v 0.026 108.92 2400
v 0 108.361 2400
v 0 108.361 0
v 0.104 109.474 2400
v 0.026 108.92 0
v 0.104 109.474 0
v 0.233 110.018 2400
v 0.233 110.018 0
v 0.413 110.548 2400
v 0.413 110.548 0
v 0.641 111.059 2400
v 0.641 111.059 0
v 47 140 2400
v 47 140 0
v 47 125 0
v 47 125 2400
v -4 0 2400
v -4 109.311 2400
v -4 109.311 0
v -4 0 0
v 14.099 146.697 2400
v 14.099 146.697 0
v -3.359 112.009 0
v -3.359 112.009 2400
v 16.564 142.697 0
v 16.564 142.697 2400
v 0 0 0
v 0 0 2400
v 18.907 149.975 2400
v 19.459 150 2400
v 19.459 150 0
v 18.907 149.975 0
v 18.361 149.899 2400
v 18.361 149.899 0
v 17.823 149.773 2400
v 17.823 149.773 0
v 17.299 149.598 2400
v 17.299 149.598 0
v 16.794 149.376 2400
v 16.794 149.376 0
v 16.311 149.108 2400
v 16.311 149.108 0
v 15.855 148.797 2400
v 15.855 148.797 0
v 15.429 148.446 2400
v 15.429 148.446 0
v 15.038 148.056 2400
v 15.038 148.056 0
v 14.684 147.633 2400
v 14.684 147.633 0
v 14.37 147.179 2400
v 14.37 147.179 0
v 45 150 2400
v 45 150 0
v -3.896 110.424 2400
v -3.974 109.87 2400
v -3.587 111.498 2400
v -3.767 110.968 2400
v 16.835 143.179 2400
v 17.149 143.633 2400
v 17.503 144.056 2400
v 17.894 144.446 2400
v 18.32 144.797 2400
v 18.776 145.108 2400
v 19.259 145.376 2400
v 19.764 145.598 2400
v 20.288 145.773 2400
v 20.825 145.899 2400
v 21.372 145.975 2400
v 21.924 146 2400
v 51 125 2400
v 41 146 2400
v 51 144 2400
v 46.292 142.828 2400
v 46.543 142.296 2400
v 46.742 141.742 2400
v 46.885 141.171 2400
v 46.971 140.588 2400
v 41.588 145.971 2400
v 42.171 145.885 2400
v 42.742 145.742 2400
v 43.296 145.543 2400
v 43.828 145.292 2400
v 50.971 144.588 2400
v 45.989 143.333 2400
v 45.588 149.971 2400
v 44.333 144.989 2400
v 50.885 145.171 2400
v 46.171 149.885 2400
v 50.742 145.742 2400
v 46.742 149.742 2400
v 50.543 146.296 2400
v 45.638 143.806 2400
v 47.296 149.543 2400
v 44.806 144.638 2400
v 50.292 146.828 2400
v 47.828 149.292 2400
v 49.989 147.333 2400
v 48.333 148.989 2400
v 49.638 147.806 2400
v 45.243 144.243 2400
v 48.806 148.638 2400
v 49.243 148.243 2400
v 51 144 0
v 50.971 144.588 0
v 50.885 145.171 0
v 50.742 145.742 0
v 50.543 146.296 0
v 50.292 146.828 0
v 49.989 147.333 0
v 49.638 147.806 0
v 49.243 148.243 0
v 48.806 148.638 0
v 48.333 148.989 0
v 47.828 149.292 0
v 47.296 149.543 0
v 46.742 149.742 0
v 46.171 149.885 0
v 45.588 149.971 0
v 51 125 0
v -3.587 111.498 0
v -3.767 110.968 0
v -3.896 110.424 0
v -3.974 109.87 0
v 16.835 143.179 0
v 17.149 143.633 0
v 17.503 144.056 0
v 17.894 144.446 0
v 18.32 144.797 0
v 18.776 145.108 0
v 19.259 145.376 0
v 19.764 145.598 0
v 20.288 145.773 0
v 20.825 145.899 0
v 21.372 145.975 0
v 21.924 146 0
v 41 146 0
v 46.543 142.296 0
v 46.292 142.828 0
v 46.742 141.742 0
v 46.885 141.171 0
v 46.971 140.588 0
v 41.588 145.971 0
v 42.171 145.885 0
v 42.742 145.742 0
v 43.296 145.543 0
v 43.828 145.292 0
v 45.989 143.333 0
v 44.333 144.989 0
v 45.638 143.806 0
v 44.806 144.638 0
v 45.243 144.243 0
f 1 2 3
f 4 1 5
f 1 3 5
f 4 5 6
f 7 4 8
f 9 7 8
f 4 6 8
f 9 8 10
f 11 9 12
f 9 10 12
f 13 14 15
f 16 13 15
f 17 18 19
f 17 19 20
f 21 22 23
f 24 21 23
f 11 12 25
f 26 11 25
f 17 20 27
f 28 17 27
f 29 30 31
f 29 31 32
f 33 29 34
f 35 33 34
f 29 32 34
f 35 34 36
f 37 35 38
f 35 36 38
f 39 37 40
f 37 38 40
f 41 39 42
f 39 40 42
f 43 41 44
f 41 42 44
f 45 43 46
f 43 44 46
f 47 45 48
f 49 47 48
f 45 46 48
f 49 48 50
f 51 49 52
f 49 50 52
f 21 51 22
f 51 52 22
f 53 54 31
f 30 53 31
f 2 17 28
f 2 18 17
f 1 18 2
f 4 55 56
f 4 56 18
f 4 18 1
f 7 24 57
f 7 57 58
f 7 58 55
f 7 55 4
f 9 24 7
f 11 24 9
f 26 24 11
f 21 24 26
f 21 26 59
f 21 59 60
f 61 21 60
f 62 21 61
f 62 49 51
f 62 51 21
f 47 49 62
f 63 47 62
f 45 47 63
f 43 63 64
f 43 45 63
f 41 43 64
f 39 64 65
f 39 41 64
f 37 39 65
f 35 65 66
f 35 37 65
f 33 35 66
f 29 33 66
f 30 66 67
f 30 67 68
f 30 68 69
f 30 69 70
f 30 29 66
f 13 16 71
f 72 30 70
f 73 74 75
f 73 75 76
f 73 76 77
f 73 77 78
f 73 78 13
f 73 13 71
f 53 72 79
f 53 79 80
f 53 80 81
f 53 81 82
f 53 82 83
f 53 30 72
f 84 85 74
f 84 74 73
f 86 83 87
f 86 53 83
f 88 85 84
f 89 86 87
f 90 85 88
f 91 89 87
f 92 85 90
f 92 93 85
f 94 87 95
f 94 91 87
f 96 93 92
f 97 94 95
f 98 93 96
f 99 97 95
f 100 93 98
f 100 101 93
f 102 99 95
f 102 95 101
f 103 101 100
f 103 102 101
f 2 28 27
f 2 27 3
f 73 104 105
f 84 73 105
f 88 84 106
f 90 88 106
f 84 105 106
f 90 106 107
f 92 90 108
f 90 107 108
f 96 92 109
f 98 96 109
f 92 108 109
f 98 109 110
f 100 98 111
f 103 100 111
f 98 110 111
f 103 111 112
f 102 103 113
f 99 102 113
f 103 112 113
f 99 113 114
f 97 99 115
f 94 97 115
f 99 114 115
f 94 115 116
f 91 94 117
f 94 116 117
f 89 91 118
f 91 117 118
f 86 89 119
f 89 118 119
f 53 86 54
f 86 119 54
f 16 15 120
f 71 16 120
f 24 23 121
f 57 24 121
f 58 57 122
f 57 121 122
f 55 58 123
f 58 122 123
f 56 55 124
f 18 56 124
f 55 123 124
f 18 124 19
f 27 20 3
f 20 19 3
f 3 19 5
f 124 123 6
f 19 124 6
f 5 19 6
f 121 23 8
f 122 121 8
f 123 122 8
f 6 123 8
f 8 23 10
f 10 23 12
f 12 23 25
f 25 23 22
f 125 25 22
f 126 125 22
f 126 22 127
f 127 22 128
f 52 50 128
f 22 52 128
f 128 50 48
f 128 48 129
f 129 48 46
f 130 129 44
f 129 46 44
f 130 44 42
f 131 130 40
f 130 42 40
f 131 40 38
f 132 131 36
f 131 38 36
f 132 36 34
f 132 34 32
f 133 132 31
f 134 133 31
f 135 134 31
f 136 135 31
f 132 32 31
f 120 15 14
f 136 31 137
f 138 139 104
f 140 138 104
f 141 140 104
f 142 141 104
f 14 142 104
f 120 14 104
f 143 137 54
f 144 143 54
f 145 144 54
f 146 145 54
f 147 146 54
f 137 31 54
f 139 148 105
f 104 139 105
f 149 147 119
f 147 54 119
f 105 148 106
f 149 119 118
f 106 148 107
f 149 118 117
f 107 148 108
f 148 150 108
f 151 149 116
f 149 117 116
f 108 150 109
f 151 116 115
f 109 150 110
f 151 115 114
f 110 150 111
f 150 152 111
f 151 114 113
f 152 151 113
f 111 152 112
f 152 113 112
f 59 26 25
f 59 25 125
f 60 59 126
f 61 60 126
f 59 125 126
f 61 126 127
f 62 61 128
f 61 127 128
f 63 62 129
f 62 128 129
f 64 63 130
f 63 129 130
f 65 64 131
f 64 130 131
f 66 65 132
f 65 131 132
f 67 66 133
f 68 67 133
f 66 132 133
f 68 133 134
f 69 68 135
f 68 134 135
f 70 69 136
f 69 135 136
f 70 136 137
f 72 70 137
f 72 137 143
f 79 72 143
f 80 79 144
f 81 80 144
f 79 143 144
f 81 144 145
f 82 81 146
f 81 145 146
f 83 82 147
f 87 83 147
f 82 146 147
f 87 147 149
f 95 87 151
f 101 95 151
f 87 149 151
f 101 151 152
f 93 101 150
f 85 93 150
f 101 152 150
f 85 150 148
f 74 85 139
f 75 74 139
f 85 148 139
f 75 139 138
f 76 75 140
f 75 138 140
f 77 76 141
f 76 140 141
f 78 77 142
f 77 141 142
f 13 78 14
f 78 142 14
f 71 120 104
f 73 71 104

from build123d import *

# Parameters (mm, degrees)
F1_DEPTH = 2400


with BuildPart() as f1:
    # F0 (on Top) → F1 (new body)
    with BuildSketch(Plane.XY):
        with BuildLine():
            Line((-4, 0), (0, 0))
            Line((0, 0), (0, 108.361391))
            ThreePointArc((0, 108.361391), (0.16233, 109.74761), (0.640534, 111.058821))
            Line((0.640534, 111.058821), (16.564311, 142.69743))
            ThreePointArc((16.564311, 142.69743), (18.776125, 145.108061), (21.923777, 146))
            Line((21.923777, 146), (41, 146))
            ThreePointArc((41, 146), (45.242641, 144.242641), (47, 140))
            Line((47, 140), (47, 125))
            Line((47, 125), (51, 125))
            Line((51, 125), (51, 144))
            ThreePointArc((51, 144), (49.242641, 148.242641), (45, 150))
            Line((45, 150), (19.458927, 150))
            ThreePointArc((19.458927, 150), (16.311275, 149.108061), (14.099461, 146.69743))
            Line((14.099461, 146.69743), (-3.359466, 112.008665))
            ThreePointArc((-3.359466, 112.008665), (-3.83767, 110.697454), (-4, 109.311235))
            Line((-4, 109.311235), (-4, 0))
        make_face()
    extrude(amount=F1_DEPTH)


solid = f1.part
